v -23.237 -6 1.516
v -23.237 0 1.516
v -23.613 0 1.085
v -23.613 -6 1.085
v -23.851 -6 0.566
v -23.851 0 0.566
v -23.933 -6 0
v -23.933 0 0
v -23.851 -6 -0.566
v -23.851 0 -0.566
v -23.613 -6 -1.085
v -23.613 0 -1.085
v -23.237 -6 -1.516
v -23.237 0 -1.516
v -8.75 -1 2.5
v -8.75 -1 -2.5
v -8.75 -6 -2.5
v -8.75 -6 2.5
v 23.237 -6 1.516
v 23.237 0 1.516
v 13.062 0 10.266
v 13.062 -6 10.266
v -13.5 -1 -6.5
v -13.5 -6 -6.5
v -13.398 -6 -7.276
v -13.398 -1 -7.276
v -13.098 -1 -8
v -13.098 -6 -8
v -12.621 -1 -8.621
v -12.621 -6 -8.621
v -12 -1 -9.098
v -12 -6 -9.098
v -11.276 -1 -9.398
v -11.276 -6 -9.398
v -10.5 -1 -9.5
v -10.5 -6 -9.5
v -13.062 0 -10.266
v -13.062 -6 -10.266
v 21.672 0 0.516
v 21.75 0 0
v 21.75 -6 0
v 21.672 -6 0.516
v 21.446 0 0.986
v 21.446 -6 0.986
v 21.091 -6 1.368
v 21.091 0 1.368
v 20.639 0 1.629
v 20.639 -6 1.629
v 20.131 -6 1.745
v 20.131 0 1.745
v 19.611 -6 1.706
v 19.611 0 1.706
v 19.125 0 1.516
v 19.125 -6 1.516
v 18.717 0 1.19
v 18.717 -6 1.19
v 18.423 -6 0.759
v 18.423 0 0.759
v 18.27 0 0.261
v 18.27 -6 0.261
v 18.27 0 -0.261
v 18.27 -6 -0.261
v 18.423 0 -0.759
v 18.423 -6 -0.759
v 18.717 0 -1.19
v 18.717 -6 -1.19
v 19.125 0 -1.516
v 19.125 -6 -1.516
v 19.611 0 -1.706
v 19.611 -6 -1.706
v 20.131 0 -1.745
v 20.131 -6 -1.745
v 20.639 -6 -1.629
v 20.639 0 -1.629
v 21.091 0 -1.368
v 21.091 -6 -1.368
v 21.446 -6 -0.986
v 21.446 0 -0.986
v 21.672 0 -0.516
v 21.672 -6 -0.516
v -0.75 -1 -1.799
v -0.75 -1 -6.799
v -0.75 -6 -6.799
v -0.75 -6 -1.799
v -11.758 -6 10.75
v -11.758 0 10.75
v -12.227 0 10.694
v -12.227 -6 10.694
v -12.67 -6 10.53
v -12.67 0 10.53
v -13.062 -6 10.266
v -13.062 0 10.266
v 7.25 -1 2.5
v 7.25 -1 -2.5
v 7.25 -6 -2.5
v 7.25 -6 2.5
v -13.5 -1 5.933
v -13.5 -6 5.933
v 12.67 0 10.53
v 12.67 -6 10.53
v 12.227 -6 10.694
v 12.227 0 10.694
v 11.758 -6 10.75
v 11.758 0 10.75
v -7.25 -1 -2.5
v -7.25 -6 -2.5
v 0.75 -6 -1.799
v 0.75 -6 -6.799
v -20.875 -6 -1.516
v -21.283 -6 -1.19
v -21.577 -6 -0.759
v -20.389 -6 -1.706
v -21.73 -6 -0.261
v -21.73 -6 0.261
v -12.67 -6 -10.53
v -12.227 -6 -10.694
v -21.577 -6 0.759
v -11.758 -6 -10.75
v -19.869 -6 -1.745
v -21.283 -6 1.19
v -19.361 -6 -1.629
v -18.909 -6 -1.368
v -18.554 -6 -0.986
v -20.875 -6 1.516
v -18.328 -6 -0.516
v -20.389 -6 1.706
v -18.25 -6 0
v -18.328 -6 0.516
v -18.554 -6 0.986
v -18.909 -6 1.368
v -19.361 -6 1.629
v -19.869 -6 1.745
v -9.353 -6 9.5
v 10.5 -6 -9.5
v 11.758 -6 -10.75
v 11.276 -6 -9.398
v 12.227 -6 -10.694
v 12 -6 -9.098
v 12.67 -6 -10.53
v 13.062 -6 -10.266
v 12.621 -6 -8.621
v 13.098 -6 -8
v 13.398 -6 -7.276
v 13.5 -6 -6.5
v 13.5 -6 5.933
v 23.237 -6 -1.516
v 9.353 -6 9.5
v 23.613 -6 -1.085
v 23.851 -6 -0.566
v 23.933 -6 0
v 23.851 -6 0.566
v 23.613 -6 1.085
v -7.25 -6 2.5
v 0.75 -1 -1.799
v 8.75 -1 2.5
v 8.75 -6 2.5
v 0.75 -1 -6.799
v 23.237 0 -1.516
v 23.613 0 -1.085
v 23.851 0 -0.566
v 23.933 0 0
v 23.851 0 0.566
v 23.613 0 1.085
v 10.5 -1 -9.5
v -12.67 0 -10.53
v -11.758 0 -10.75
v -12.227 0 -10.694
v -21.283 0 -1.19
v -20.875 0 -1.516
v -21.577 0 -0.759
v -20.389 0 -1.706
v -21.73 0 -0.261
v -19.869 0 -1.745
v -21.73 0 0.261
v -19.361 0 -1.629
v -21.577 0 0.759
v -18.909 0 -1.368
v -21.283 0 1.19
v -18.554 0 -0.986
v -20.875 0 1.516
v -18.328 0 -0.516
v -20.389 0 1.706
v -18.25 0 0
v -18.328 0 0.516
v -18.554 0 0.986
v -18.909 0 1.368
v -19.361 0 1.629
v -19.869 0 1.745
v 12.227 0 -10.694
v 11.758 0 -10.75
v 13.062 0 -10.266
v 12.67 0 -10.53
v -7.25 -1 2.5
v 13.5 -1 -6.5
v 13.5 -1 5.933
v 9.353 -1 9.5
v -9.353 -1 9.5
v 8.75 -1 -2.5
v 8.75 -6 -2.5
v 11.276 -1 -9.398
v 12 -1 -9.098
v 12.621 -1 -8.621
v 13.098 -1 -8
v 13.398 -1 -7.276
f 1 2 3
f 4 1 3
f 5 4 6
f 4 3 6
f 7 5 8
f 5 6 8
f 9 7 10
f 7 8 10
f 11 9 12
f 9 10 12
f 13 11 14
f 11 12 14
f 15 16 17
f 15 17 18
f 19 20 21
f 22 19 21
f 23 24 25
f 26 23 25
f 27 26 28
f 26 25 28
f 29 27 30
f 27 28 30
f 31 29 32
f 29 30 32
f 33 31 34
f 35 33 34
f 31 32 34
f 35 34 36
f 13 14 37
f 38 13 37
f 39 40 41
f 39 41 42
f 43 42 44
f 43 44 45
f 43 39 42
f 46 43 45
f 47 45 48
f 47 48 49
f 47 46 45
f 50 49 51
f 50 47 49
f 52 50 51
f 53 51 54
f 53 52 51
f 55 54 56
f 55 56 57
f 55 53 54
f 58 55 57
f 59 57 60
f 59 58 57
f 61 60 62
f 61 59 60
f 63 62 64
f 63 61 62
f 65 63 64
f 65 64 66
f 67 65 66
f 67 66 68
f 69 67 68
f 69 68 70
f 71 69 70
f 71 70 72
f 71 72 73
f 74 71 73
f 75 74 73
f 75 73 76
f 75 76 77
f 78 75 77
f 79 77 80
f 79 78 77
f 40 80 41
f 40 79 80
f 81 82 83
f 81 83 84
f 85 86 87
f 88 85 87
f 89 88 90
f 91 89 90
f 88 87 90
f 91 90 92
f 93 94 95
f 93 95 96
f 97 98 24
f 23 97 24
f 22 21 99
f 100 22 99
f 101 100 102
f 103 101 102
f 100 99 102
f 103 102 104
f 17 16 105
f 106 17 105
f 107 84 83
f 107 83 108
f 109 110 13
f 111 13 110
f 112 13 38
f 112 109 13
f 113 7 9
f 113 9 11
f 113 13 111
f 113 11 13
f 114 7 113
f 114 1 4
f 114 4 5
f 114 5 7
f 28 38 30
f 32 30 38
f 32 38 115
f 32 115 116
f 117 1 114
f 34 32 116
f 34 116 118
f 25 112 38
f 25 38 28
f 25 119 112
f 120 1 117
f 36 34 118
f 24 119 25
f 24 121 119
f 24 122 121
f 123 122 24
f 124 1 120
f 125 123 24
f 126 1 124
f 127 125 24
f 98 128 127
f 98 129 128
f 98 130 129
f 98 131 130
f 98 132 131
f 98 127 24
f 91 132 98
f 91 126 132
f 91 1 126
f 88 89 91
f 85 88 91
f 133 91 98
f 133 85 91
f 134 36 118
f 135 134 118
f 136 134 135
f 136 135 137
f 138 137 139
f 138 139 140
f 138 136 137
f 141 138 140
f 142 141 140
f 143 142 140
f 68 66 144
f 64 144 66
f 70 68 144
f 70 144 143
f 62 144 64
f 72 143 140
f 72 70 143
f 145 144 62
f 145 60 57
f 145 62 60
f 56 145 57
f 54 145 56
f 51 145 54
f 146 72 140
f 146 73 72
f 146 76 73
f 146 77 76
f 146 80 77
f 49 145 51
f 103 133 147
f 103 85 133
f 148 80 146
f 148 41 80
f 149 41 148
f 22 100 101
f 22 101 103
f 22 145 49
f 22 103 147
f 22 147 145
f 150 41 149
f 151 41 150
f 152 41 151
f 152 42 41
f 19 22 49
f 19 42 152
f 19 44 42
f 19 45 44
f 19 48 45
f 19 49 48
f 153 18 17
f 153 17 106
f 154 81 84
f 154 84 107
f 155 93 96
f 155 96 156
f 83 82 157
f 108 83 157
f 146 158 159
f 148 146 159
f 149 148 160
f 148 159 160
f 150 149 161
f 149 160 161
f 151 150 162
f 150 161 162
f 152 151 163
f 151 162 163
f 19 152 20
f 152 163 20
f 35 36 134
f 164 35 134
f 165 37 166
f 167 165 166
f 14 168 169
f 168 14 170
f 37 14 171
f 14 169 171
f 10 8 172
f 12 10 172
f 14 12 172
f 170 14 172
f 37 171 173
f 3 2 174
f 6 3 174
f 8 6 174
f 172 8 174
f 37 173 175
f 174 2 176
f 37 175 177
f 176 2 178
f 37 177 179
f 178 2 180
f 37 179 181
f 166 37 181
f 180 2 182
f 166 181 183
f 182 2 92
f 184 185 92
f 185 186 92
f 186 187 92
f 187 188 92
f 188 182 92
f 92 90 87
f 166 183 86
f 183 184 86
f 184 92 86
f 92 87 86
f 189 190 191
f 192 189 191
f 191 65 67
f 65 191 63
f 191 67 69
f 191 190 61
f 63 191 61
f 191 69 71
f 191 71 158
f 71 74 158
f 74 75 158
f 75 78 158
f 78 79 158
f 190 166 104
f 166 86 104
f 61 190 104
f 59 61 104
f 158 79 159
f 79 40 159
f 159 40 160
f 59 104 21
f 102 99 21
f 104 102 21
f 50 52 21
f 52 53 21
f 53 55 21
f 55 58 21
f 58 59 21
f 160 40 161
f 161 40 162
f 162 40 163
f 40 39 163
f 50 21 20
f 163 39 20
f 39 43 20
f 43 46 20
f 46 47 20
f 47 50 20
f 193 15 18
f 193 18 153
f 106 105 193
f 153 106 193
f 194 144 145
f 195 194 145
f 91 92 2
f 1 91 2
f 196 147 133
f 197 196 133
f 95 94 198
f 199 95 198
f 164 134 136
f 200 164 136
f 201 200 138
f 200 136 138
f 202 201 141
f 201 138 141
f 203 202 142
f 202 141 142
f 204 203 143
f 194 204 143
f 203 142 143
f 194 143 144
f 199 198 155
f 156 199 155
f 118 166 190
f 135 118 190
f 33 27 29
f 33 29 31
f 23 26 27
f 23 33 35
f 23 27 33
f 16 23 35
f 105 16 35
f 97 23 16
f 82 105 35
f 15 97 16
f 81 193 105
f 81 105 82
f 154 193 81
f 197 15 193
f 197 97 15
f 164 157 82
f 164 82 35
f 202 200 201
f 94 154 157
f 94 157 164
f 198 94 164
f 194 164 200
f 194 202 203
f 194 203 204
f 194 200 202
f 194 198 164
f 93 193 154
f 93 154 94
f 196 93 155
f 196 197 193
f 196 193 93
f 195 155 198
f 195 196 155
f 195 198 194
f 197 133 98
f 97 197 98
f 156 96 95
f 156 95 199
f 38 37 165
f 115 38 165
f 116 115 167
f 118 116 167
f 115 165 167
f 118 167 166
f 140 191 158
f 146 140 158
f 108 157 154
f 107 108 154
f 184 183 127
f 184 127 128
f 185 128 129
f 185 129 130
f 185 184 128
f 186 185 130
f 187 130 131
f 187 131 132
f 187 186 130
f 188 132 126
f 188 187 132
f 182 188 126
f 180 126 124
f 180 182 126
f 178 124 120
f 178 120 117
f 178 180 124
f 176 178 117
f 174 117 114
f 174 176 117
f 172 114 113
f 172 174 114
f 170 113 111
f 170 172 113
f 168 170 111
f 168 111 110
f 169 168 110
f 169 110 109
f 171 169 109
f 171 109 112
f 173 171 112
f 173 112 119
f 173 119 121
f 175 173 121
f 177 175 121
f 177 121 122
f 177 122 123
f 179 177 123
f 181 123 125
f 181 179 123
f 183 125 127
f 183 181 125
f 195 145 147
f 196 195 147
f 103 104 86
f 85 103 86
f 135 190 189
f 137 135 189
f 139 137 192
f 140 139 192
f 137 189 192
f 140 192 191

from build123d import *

# Parameters (mm, degrees)
F0_R     = 1.75
F1_DEPTH = 6
F3_DEPTH = 5
F4_W     = 1.5
F4_H     = 5
F5_DEPTH = 5


with BuildPart() as f1:
    # F0 (on Front) → F1 (new body)
    with BuildSketch(Plane.XZ):
        with BuildLine():
            Line((23.236779, 1.51637), (13.06236, 10.26637))
            ThreePointArc((13.06236, 10.26637), (12.453716, 10.625199), (11.758281, 10.75))
            Line((11.758281, 10.75), (0, 10.75))
            Line((0, 10.75), (-11.758281, 10.75))
            ThreePointArc((-11.758281, 10.75), (-12.453716, 10.625199), (-13.06236, 10.26637))
            Line((-13.06236, 10.26637), (-23.236779, 1.51637))
            ThreePointArc((-23.236779, 1.51637), (-23.9327, 0), (-23.236779, -1.51637))
            Line((-23.236779, -1.51637), (-13.06236, -10.26637))
            ThreePointArc((-13.06236, -10.26637), (-12.453716, -10.625199), (-11.758281, -10.75))
            Line((-11.758281, -10.75), (0, -10.75))
            Line((0, -10.75), (11.758281, -10.75))
            ThreePointArc((11.758281, -10.75), (12.453716, -10.625199), (13.06236, -10.26637))
            Line((13.06236, -10.26637), (23.236779, -1.51637))
            ThreePointArc((23.236779, -1.51637), (23.9327, 0), (23.236779, 1.51637))
        make_face()
        with Locations((-20, 0)):
            Circle(F0_R, mode=Mode.SUBTRACT)
        with Locations((20, 0)):
            Circle(F0_R, mode=Mode.SUBTRACT)
    extrude(amount=F1_DEPTH)

    # F2 (on face) → F3 (cut)
    with BuildSketch(Plane.XZ.offset(6)):
        with BuildLine():
            Line((-13.5, 5.933183), (-13.5, -6.5))
            ThreePointArc((-13.5, -6.5), (-12.62132, -8.62132), (-10.5, -9.5))
            Line((-10.5, -9.5), (10.5, -9.5))
            ThreePointArc((10.5, -9.5), (12.62132, -8.62132), (13.5, -6.5))
            Line((13.5, -6.5), (13.5, 5.933183))
            Line((13.5, 5.933183), (9.352538, 9.5))
            Line((9.352538, 9.5), (-9.352538, 9.5))
            Line((-9.352538, 9.5), (-13.5, 5.933183))
        make_face()
    extrude(amount=-F3_DEPTH, mode=Mode.SUBTRACT)

    # F4 (on face) → F5 (join)
    with BuildSketch(Plane.XZ.offset(1)):
        with Locations((0, -4.298508)):
            Rectangle(F4_W, F4_H)
        with Locations((-8, 0)):
            Rectangle(F4_W, F4_H)
        with Locations((8, 0)):
            Rectangle(F4_W, F4_H)
    extrude(amount=F5_DEPTH)


solid = f1.part
